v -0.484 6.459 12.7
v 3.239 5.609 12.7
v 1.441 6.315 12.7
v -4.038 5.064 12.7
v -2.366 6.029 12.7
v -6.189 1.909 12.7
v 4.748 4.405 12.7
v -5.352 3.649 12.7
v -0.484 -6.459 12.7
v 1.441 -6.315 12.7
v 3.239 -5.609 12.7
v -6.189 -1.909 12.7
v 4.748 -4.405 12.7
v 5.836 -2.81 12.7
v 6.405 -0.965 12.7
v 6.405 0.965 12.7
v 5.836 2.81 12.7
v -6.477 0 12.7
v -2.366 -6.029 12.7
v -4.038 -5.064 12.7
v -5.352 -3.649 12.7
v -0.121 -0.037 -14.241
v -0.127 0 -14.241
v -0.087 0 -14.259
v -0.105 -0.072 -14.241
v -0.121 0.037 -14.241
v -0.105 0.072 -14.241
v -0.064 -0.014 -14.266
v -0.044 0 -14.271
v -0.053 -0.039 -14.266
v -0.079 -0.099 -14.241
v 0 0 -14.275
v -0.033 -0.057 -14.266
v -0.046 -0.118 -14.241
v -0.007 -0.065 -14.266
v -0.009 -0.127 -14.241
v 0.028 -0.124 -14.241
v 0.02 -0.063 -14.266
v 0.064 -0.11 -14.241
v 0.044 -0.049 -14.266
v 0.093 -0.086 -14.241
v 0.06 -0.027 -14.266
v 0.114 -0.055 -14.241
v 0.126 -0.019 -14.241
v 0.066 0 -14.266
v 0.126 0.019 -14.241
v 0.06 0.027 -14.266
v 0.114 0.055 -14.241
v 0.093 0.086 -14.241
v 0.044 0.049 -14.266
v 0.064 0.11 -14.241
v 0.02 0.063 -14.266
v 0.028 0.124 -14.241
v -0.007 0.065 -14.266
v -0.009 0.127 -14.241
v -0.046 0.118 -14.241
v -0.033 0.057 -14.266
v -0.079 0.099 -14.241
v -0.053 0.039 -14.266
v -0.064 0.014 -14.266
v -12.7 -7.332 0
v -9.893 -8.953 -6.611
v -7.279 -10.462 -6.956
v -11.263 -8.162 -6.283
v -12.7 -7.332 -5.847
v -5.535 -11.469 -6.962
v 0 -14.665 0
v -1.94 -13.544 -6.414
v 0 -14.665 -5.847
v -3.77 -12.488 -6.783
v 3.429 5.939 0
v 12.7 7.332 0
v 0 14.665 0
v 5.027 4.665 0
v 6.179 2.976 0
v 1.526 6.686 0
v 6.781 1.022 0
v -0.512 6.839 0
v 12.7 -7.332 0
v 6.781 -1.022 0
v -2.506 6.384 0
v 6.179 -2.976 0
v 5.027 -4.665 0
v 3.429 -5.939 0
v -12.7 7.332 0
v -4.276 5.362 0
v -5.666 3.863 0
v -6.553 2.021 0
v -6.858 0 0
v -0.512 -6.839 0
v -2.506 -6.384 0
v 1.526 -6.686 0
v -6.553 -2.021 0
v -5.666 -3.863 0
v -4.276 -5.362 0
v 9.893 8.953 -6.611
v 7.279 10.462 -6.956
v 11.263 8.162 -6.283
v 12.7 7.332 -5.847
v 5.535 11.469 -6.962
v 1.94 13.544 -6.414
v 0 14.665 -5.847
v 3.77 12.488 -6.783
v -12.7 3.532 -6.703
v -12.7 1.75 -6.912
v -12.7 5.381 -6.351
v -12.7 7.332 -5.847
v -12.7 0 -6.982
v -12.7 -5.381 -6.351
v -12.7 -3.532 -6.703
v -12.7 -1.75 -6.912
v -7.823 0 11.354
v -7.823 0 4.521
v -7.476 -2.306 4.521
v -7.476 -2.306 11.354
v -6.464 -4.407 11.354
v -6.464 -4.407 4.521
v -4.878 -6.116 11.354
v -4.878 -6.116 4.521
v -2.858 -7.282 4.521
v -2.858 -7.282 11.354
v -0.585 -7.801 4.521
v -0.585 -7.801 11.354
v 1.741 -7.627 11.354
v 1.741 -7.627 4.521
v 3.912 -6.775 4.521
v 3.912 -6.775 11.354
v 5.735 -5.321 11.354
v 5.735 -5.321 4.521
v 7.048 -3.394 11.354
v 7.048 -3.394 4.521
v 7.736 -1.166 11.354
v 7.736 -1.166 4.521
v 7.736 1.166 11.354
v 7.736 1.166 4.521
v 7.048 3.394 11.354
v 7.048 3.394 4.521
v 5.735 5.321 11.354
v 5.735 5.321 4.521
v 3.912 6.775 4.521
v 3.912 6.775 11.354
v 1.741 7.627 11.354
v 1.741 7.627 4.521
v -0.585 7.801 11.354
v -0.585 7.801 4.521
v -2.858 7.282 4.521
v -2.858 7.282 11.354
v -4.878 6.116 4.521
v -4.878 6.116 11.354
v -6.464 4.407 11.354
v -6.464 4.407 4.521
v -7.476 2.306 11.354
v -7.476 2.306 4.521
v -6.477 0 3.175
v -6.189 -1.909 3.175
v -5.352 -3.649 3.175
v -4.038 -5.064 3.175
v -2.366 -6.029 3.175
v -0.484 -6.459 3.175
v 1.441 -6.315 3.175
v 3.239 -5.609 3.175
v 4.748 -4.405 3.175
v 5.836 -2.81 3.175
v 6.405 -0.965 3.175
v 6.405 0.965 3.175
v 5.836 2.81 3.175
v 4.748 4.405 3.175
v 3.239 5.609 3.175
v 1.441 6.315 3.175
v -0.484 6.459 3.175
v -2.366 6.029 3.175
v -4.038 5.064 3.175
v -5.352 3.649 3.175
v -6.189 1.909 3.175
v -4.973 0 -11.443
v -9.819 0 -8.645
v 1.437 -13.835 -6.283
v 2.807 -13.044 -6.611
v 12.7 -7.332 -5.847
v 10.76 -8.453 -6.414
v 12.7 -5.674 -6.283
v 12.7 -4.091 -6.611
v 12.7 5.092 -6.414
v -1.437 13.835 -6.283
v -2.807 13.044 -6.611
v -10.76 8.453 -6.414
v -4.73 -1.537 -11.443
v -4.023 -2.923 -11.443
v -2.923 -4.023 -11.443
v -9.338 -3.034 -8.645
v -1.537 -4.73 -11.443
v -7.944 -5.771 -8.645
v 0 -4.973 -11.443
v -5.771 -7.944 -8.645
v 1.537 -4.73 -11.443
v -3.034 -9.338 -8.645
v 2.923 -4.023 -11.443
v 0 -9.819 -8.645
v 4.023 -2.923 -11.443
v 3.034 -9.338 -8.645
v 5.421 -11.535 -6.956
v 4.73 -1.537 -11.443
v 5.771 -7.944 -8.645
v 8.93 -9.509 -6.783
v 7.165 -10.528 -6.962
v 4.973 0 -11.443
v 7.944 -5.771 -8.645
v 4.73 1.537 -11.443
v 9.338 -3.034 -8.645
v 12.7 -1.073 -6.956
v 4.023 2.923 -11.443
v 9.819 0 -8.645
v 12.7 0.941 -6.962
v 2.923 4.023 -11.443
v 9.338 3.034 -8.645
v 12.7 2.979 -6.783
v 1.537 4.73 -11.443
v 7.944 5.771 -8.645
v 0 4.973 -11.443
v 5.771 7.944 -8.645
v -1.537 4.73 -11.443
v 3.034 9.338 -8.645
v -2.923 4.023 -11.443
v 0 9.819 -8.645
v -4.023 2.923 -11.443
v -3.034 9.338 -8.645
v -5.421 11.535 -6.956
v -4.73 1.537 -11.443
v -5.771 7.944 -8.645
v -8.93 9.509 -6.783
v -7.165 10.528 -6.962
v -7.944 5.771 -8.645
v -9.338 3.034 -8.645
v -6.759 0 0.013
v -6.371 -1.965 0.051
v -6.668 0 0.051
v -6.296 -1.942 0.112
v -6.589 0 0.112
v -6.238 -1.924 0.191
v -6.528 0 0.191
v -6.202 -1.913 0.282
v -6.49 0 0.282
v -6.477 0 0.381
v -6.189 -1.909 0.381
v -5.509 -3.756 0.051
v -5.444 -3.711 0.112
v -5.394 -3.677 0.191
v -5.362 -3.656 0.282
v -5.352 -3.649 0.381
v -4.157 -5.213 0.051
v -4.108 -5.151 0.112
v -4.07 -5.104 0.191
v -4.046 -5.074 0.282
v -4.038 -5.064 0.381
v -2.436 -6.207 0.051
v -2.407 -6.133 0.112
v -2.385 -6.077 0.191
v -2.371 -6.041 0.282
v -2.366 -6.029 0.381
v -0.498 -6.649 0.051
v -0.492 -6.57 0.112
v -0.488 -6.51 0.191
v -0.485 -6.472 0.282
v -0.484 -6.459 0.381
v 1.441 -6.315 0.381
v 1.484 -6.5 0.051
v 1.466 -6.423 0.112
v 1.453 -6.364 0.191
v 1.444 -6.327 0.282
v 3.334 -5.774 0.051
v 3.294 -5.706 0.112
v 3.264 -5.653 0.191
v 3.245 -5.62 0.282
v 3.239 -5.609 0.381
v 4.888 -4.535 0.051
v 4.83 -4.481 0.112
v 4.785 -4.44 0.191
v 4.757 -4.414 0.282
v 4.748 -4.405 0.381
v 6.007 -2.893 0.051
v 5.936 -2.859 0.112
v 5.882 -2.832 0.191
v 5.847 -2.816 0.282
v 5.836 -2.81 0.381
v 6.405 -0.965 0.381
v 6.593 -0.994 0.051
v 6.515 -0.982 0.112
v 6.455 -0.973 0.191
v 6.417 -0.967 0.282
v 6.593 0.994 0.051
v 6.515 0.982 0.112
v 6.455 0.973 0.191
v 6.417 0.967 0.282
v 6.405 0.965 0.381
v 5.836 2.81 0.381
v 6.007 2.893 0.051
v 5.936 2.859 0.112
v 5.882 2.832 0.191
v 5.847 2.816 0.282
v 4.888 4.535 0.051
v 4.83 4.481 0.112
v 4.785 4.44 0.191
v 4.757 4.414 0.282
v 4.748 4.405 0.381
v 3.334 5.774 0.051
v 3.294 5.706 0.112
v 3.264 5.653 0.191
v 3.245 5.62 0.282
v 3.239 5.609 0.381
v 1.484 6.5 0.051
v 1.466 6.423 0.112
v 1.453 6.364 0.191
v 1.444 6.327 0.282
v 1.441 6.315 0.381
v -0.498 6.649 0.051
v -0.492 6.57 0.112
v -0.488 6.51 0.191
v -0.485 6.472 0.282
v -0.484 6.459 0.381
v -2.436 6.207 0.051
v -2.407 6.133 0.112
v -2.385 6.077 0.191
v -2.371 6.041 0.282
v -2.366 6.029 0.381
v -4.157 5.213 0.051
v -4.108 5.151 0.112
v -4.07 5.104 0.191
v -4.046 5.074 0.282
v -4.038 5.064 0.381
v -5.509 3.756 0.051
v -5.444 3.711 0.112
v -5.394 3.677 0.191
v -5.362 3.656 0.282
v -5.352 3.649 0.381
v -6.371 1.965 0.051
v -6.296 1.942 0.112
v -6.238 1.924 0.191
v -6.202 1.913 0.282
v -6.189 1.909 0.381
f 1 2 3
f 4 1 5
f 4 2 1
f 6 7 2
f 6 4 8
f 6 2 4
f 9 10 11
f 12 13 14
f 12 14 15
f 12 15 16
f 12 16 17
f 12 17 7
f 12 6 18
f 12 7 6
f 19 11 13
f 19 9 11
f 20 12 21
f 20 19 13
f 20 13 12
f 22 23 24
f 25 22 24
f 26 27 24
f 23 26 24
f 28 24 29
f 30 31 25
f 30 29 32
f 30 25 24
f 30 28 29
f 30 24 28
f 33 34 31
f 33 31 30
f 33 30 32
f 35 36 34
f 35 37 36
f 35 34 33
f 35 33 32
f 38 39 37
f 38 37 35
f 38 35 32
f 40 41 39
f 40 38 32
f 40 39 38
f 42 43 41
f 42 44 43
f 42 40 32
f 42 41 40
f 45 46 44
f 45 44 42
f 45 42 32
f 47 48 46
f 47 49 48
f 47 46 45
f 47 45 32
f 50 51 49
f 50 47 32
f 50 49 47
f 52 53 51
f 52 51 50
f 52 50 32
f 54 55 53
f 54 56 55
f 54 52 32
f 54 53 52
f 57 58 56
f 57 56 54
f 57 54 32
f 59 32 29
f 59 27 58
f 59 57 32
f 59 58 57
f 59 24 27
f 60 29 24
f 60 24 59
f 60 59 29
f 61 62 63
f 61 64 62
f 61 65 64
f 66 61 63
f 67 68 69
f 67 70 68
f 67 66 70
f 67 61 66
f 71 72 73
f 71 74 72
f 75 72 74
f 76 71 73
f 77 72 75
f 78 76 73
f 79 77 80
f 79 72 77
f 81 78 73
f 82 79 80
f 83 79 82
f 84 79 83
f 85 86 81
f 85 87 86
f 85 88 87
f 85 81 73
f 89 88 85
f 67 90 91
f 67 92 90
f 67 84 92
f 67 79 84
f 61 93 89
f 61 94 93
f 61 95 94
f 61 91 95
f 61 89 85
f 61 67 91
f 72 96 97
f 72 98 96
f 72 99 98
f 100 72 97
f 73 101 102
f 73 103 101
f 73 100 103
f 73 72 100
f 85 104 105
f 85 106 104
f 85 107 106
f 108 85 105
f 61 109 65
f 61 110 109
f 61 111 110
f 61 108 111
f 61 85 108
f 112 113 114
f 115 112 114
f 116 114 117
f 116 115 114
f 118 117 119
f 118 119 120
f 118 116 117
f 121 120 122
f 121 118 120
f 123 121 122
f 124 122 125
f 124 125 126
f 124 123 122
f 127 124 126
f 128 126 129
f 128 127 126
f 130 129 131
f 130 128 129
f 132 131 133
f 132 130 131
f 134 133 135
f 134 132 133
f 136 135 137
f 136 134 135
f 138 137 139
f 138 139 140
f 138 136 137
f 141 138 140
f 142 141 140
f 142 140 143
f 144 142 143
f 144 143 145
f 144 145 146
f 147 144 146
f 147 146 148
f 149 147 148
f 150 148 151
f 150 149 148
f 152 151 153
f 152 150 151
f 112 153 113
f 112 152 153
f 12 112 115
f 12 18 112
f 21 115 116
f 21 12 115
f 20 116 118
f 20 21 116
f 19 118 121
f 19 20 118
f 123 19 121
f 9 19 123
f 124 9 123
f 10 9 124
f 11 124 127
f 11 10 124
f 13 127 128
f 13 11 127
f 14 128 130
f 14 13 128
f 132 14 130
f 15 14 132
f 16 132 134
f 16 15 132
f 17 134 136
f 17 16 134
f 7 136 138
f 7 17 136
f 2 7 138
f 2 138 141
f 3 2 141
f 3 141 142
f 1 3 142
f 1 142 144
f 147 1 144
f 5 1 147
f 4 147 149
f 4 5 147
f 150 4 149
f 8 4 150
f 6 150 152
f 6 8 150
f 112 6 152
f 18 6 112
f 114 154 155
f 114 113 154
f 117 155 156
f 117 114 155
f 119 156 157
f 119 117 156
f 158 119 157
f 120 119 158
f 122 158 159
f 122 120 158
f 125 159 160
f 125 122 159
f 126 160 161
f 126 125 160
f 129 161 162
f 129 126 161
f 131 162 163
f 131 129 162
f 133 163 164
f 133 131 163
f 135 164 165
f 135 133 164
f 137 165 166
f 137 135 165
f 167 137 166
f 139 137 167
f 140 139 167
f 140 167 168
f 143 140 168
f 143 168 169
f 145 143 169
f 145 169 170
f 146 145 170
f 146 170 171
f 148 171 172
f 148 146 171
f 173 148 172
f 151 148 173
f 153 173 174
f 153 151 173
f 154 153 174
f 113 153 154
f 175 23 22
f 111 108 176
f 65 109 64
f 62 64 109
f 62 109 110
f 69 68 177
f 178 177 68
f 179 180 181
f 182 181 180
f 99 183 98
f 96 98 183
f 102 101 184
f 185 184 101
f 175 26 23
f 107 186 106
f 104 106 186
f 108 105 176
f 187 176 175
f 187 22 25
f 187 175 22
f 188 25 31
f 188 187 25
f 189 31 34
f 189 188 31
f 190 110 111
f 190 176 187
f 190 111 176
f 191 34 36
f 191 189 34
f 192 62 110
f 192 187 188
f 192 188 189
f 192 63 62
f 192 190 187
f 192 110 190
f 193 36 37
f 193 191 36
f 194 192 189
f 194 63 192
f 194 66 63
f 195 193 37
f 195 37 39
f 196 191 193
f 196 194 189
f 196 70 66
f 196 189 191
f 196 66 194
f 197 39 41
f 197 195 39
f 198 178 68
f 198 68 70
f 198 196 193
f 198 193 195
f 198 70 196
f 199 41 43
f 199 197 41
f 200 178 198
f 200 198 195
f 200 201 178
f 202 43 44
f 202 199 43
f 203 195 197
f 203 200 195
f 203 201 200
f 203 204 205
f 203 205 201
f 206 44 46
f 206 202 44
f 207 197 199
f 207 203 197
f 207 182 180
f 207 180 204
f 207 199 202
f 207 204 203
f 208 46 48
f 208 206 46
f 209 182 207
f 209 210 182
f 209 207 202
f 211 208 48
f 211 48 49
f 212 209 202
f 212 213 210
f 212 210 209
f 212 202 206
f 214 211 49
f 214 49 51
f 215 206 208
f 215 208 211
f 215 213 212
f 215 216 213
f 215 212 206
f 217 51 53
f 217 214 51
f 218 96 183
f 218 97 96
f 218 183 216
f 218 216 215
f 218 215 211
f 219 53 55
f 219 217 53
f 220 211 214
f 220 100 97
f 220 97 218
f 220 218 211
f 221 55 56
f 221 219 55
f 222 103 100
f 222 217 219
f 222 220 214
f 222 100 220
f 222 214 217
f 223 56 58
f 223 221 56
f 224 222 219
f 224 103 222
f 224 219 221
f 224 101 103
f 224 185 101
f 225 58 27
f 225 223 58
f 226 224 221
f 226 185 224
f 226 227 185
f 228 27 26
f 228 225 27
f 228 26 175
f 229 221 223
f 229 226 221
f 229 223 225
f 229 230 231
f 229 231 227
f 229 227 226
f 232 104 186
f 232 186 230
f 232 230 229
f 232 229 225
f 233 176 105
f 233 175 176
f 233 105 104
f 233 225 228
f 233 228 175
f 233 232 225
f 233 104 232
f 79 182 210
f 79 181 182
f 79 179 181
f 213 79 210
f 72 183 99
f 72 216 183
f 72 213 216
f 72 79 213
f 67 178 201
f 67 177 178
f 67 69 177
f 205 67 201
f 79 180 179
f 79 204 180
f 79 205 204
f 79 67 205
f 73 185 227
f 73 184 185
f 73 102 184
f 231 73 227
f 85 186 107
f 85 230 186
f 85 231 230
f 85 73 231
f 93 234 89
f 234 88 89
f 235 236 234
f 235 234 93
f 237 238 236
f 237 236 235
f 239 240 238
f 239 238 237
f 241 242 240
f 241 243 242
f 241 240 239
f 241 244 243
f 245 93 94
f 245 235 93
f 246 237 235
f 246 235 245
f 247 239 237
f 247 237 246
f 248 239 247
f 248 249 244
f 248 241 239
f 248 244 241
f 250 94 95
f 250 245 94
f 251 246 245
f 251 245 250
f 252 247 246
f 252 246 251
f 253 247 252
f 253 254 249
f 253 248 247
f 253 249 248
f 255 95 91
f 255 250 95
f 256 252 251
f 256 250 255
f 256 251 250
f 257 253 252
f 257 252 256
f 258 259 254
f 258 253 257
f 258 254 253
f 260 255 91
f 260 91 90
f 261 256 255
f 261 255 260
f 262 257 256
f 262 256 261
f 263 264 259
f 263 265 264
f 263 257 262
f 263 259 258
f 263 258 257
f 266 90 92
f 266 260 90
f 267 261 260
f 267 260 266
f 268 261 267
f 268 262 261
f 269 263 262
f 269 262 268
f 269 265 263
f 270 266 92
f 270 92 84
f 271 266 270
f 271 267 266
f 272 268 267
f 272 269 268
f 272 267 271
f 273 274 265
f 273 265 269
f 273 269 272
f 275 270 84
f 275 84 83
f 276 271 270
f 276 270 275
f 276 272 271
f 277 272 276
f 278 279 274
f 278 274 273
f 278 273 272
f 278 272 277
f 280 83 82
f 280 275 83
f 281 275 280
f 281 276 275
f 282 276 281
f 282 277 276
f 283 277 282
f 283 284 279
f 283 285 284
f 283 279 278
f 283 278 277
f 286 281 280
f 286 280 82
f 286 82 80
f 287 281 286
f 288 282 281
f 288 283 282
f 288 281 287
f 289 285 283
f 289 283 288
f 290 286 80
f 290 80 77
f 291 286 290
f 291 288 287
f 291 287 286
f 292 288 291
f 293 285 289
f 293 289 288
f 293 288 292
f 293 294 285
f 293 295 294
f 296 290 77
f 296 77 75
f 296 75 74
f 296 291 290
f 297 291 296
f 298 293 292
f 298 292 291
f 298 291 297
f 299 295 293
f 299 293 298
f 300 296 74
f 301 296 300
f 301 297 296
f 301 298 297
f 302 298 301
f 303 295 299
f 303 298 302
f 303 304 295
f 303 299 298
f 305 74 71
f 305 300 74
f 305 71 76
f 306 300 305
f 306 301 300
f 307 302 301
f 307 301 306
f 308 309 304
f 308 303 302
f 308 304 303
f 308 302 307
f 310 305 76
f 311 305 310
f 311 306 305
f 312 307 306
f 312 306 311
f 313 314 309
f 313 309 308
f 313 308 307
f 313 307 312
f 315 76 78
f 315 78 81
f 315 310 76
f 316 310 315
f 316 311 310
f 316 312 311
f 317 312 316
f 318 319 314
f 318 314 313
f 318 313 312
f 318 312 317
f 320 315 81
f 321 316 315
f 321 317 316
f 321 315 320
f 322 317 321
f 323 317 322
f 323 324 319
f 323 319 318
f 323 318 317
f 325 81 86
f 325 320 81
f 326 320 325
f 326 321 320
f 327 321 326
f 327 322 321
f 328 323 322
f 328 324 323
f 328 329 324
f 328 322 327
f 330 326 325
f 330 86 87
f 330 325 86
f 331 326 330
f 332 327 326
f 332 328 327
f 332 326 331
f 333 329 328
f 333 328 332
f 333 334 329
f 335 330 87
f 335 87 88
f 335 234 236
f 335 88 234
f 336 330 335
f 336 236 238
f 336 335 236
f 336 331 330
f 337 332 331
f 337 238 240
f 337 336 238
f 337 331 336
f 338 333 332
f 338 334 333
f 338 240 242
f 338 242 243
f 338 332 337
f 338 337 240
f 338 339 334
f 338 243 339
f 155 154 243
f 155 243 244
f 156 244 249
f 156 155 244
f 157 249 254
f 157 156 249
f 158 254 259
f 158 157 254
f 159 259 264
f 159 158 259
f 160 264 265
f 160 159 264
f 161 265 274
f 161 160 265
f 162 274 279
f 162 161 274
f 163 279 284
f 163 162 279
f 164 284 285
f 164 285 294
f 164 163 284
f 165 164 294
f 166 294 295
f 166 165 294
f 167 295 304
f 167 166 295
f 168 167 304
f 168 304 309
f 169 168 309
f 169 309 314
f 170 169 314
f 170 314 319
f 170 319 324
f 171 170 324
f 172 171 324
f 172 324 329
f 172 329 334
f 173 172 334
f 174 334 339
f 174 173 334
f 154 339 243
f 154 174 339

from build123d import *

# Parameters (mm, degrees)
SKETCH2_OUTSIDE_W  = 66.612
SKETCH2_OUTSIDE_H  = 66.612
CUT_EXTRUDE1_DEPTH = 15.2748
FILLET1_R          = 0.381


with BuildPart() as part:
    # Sketch1 → Revolve1 (revolve)
    with BuildSketch(Plane(origin=(0, 0, 0), x_dir=(0, 0, -1), z_dir=(1, 0, 0)), mode=Mode.PRIVATE) as revolve1_sk:
        with BuildLine():
            Line((0, 24.792737963), (0, 6.477))
            Line((0, 6.477), (-3.175, 6.477))
            Line((-3.175, 6.477), (-4.5212, 7.8232))
            Line((-4.5212, 7.8232), (-11.3538, 7.8232))
            Line((-11.3538, 7.8232), (-12.7, 6.477))
            Line((-12.7, 6.477), (-12.7, 0))
            Line((-12.7, 0), (14.2748, 0))
            ThreePointArc((14.2748, 0), (14.26614516, 0.065740037), (14.240770453, 0.127))
            Line((14.240770453, 0.127), (0, 24.792737963))
        make_face()
    revolve(revolve1_sk.sketch.rotate(Axis((0, 0, 0), (0, 0, 1)), 90), axis=Axis((0, 0, 0), (0, 0, 1)))  # turned: the seam where the file's is

    # Sketch2 outside → Cut-Extrude1 (cut, through all)
    with BuildSketch(Plane.XY):
        Rectangle(SKETCH2_OUTSIDE_W, SKETCH2_OUTSIDE_H)
        Polygon((0, 14.664696837), (-12.7, 7.332348419), (-12.7, -7.332348419), (0, -14.664696837), (12.7, -7.332348419), (12.7, 7.332348419), align=None, mode=Mode.SUBTRACT)
    extrude(amount=-CUT_EXTRUDE1_DEPTH, mode=Mode.SUBTRACT)

    # Fillet1
    fillet1_edges = [part.edges().sort_by_distance(p)[0] for p in [
        (6.477, 0, 0),
    ]]
    fillet(fillet1_edges, radius=FILLET1_R)


solid = part.part
